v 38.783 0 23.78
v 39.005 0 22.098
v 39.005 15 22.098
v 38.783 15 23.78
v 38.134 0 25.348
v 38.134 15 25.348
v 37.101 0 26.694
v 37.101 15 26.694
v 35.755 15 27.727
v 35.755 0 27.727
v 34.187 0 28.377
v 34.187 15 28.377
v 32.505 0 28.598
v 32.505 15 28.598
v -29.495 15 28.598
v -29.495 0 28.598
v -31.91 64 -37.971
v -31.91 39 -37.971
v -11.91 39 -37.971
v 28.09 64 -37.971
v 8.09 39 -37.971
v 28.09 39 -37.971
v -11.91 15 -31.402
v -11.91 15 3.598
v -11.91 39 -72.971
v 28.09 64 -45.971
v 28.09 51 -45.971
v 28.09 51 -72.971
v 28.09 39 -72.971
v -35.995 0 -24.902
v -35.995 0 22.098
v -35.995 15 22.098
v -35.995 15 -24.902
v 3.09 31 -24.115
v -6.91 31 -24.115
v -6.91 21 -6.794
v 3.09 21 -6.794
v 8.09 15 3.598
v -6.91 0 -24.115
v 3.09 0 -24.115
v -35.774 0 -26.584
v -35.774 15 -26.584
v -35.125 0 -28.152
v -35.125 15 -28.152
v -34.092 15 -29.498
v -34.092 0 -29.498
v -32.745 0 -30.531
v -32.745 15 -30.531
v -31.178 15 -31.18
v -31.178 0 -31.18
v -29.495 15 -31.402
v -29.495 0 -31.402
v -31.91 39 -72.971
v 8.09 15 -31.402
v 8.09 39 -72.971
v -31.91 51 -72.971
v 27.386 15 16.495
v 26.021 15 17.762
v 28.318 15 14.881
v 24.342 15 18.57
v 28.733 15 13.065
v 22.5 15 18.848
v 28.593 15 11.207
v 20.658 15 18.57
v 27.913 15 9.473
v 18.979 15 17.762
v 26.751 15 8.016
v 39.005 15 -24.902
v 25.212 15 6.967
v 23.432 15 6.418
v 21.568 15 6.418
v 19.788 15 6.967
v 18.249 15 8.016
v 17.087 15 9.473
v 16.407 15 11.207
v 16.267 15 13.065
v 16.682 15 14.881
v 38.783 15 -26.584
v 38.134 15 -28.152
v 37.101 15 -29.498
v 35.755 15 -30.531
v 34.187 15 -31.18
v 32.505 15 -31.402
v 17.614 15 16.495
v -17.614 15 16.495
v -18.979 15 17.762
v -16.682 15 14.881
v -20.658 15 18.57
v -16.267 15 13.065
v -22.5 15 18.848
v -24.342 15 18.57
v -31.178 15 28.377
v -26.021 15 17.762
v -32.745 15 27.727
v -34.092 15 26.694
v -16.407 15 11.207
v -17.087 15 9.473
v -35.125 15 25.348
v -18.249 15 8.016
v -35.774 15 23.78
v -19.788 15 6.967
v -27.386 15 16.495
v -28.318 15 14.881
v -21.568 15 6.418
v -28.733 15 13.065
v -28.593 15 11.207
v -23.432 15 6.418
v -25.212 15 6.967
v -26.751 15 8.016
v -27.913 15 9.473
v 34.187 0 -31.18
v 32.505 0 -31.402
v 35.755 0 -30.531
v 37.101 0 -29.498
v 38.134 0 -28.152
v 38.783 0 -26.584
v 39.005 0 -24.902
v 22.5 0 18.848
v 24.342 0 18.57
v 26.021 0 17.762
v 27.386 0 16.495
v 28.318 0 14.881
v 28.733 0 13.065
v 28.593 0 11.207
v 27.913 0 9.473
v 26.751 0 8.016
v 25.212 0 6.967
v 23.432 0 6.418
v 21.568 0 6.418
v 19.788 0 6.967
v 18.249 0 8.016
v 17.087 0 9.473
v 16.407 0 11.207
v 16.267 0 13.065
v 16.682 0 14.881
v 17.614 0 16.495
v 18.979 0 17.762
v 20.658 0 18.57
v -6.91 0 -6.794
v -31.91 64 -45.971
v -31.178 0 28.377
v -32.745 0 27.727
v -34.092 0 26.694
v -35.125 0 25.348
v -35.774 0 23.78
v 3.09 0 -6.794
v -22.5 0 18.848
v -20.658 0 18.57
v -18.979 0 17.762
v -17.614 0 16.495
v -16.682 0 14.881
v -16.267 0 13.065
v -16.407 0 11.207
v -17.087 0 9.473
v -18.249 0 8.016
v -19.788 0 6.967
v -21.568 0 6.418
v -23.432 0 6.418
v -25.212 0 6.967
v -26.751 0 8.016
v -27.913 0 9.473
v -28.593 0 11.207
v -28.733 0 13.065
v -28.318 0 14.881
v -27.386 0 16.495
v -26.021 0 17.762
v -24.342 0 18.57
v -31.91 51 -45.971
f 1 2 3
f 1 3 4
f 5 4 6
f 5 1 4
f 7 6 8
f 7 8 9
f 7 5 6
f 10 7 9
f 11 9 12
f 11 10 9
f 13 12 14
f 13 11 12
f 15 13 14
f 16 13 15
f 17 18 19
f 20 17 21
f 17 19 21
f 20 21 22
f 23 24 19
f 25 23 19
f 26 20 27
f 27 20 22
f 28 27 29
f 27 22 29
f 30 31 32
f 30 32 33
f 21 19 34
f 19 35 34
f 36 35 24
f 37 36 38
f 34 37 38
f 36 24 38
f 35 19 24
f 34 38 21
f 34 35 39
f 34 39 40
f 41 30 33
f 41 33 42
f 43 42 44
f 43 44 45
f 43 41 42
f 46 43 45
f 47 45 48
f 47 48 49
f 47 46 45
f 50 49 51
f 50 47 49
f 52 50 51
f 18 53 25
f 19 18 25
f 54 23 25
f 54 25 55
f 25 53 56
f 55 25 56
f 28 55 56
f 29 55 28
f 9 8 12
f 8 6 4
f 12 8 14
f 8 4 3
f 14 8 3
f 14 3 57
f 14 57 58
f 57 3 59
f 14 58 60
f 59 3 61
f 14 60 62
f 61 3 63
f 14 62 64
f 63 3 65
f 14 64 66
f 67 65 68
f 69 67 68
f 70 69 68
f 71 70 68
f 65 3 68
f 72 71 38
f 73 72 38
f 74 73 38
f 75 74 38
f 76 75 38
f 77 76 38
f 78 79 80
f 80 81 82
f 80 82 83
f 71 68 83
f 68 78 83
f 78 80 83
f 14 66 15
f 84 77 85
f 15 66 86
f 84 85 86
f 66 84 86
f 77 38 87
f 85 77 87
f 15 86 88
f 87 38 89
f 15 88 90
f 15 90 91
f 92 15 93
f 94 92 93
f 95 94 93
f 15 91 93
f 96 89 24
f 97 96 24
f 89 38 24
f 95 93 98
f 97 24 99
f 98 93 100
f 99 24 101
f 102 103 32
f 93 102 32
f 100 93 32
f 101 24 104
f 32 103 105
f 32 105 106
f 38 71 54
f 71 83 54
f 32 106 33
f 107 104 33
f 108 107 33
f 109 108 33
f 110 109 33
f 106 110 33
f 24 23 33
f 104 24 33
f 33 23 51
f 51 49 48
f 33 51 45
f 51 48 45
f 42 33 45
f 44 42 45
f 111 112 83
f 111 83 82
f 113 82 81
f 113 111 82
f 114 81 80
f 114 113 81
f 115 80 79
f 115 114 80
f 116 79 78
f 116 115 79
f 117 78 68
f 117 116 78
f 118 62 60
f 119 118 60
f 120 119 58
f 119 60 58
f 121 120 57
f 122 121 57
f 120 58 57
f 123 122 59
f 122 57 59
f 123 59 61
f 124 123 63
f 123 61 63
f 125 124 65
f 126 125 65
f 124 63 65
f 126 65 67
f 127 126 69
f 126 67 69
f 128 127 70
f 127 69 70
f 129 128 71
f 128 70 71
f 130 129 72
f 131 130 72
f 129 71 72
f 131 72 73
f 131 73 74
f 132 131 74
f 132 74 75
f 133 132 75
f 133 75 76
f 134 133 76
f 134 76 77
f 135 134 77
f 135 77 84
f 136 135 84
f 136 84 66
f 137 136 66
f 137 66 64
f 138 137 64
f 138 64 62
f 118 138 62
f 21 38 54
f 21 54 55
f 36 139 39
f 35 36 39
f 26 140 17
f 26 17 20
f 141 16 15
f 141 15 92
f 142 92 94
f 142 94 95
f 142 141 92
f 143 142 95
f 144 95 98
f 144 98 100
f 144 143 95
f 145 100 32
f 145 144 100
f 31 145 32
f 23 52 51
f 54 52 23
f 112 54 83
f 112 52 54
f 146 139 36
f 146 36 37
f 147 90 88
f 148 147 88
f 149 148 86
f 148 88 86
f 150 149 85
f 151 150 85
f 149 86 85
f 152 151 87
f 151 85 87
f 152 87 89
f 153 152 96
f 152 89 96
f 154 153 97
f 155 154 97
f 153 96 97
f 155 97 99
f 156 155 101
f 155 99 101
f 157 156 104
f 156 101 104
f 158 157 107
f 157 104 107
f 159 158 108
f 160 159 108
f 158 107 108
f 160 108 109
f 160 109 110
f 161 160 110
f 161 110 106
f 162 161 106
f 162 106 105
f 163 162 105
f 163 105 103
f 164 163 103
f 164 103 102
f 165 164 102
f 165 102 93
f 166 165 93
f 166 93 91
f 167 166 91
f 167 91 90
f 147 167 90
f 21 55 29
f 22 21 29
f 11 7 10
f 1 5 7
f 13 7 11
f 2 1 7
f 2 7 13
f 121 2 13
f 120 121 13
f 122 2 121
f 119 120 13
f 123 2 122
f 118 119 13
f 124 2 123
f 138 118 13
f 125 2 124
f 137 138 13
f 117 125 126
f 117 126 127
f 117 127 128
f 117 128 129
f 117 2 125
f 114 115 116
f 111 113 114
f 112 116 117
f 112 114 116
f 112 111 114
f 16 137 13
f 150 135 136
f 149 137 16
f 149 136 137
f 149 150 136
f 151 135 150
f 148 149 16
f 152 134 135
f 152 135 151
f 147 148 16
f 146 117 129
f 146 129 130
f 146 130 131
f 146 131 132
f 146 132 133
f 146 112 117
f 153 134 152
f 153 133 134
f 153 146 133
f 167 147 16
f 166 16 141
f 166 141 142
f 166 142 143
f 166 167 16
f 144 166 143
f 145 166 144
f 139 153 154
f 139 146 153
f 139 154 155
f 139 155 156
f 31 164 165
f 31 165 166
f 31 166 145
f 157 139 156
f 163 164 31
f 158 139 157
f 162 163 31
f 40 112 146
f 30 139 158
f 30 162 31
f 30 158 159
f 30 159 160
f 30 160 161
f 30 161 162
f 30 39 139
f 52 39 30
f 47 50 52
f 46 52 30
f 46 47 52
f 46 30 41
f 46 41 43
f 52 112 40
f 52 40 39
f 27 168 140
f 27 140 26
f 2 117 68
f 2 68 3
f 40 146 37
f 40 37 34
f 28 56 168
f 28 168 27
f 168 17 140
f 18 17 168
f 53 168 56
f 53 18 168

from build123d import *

# Parameters (mm, degrees)
BOSS_EXTRUDE1_DEPTH = 15
SKETCH5_R           = 6.25
CUT_EXTRUDE1_DEPTH  = 22
SKETCH7_W           = 20
SKETCH7_H           = 35
BOSS_EXTRUDE4_DEPTH = 48
SKETCH19_W          = 10
SKETCH19_H          = 20
CUT_EXTRUDE2_DEPTH  = 65
SKETCH22_W          = 60
SKETCH22_H          = 35
BOSS_EXTRUDE5_DEPTH = 12
SKETCH23_W          = 60
SKETCH23_H          = 8
BOSS_EXTRUDE6_DEPTH = 13


with BuildPart() as part:
    # Sketch3 → Boss-Extrude1 (new body)
    with BuildSketch(Plane(origin=(0, 0, 0), x_dir=(1, 0, 0), z_dir=(0, 1, 0))):
        with BuildLine():
            Line((-29.495428398, 31.401945846), (32.504571602, 31.401945846))
            ThreePointArc((32.504571602, 31.401945846), (37.100765679, 29.498139924), (39.004571602, 24.901945846))
            Line((39.004571602, 24.901945846), (39.004571602, -22.098054154))
            ThreePointArc((39.004571602, -22.098054154), (37.100765679, -26.694248232), (32.504571602, -28.598054154))
            Line((32.504571602, -28.598054154), (-29.495428398, -28.598054154))
            ThreePointArc((-29.495428398, -28.598054154), (-34.091622476, -26.694248232), (-35.995428398, -22.098054154))
            Line((-35.995428398, -22.098054154), (-35.995428398, 24.901945846))
            ThreePointArc((-35.995428398, 24.901945846), (-34.091622476, 29.498139924), (-29.495428398, 31.401945846))
        make_face()
    extrude(amount=BOSS_EXTRUDE1_DEPTH)

    # Sketch5 → Cut-Extrude1 (cut)
    with BuildSketch(Plane(origin=(0, 15, 0), x_dir=(1, 0, 0), z_dir=(0, 1, 0))):
        with Locations(Location((-22.5, -12.598054154, 0), (0, 0, 270))):
            Circle(SKETCH5_R)
        with Locations(Location((22.5, -12.598054154, 0), (0, 0, 270))):
            Circle(SKETCH5_R)
    extrude(amount=-CUT_EXTRUDE1_DEPTH, mode=Mode.SUBTRACT)

    # Sketch7 → Boss-Extrude4 (add, along a direction that is not the sketch's normal)
    with BuildSketch(Plane(origin=(0, 15, 0), x_dir=(1, 0, 0), z_dir=(0, 1, 0))):
        with Locations((-1.909590385, 13.901945846)):
            Rectangle(SKETCH7_W, SKETCH7_H)
    extrude(amount=BOSS_EXTRUDE4_DEPTH, dir=(0, 0.5000000000000001, -0.8660254037844387))

    # Sketch19 → Cut-Extrude2 (cut, along a direction that is not the sketch's normal)
    with BuildSketch(Plane(origin=(0, 12.808003151, 7.394704067), x_dir=(1, 0, 0), z_dir=(0, 0.8660254037844377, 0.5000000000000016))):
        with Locations((-1.909590385, 26.383993698)):
            Rectangle(SKETCH19_W, SKETCH19_H)
    extrude(amount=-CUT_EXTRUDE2_DEPTH, dir=(0, 1, 0), mode=Mode.SUBTRACT)

    # Sketch22 → Boss-Extrude5 (add)
    with BuildSketch(Plane(origin=(0, 39, 0), x_dir=(1, 0, 0), z_dir=(0, 1, 0))):
        with Locations((-1.909590385, 55.471165228)):
            Rectangle(SKETCH22_W, SKETCH22_H)
    extrude(amount=BOSS_EXTRUDE5_DEPTH)

    # Sketch23 → Boss-Extrude6 (add)
    with BuildSketch(Plane(origin=(0, 51, 0), x_dir=(1, 0, 0), z_dir=(0, 1, 0))):
        with Locations((-1.909590385, 41.971165228)):
            Rectangle(SKETCH23_W, SKETCH23_H)
    extrude(amount=BOSS_EXTRUDE6_DEPTH)


solid = part.part
